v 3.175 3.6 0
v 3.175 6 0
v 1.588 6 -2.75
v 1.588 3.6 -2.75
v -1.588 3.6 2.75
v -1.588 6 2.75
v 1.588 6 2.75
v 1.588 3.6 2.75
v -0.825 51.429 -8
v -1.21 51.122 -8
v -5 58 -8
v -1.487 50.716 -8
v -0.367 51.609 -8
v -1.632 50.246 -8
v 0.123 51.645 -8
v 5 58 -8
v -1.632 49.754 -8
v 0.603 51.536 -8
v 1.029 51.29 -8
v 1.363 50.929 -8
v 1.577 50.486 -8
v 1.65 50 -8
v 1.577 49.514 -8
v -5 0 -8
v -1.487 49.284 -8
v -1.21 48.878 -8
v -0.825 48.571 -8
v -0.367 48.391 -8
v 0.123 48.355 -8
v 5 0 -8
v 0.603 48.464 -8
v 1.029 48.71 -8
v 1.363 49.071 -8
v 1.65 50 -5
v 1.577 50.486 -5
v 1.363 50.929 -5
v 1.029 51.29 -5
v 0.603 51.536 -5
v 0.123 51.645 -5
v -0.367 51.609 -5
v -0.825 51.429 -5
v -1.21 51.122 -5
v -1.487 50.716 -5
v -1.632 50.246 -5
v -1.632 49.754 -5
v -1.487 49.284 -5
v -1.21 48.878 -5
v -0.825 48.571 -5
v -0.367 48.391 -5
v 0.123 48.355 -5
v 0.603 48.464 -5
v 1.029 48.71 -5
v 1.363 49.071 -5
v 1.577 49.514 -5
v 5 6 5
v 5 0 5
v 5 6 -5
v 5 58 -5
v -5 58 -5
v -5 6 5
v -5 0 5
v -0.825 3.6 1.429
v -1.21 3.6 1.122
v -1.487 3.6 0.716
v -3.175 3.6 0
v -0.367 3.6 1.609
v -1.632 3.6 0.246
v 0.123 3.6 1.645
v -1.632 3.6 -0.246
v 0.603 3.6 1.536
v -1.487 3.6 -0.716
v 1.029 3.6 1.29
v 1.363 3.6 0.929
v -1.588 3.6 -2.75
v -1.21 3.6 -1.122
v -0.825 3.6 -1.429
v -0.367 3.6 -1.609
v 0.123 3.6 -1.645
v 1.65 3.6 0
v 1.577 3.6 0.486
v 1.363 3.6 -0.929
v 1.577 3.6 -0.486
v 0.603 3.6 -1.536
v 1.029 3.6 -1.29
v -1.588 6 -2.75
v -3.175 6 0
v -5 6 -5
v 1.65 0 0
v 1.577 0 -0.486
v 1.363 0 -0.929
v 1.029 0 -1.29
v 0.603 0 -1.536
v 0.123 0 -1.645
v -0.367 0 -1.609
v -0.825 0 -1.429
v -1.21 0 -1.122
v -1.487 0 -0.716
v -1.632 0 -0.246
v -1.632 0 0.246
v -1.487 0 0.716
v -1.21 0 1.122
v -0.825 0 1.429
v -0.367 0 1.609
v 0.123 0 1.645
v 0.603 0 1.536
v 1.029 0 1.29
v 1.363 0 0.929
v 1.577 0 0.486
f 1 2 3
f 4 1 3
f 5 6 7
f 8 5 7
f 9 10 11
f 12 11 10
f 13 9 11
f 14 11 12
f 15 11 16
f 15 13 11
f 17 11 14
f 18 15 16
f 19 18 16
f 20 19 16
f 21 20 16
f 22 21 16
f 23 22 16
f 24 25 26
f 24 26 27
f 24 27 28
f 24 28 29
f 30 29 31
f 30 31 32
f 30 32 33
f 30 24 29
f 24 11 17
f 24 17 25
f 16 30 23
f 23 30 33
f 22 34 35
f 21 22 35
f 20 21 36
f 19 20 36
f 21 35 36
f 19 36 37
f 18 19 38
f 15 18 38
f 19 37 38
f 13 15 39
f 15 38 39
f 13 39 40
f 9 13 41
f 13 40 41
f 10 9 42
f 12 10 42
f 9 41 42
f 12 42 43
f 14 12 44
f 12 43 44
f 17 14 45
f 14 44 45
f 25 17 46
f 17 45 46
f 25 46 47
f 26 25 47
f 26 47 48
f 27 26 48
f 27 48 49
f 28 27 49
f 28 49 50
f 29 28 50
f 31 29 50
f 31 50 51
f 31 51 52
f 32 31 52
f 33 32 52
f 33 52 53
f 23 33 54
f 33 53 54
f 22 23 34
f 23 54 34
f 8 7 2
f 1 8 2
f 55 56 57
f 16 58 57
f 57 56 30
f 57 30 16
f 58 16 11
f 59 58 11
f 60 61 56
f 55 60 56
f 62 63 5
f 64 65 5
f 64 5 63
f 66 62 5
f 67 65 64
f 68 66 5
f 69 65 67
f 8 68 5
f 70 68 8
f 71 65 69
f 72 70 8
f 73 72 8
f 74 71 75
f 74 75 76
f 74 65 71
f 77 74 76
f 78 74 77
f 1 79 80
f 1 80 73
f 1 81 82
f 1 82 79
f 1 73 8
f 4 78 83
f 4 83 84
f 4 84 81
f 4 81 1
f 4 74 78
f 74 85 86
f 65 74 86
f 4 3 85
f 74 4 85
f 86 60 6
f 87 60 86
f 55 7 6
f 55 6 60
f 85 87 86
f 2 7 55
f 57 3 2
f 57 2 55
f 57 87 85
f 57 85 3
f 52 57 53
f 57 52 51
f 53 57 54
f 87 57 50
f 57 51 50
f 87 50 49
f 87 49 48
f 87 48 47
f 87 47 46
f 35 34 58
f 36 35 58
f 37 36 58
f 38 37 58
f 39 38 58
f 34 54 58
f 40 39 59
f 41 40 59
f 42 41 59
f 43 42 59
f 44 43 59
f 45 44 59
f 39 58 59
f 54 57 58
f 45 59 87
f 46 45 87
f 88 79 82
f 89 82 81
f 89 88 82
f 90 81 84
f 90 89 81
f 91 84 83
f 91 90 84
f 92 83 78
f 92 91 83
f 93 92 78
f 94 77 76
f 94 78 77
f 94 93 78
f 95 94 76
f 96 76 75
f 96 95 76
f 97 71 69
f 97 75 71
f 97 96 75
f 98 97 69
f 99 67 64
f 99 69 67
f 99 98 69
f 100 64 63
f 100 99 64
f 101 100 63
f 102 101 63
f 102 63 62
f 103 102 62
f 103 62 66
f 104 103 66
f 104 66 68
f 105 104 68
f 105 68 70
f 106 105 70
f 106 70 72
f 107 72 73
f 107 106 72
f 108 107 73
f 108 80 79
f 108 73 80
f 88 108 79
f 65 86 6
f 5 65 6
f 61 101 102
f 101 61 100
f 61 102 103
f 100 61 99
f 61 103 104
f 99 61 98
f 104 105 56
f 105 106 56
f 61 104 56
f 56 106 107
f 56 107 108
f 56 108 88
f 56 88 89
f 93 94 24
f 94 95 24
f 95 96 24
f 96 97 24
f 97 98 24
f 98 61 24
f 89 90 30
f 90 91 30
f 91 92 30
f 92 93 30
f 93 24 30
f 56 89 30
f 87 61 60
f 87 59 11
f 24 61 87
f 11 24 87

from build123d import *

# Parameters (mm, degrees)
SKETCH1_W           = 10
SKETCH1_H           = 13
SKETCH1_R           = 1.65
BOSS_EXTRUDE1_DEPTH = 6
CUT_EXTRUDE1_DEPTH  = 2.4
SKETCH3_W           = 10
SKETCH3_H           = 58
BOSS_EXTRUDE2_DEPTH = 3
SKETCH4_R           = 1.65
CUT_EXTRUDE2_DEPTH  = 3


with BuildPart() as part:
    # Sketch1 → Boss-Extrude1 (new body)
    with BuildSketch(Plane(origin=(0, 0, 0), x_dir=(1, 0, 0), z_dir=(0, 1, 0))):
        with Locations((0, 1.5)):
            Rectangle(SKETCH1_W, SKETCH1_H)
        Circle(SKETCH1_R, mode=Mode.SUBTRACT)
    extrude(amount=BOSS_EXTRUDE1_DEPTH)

    # Sketch2 → Cut-Extrude1 (cut)
    with BuildSketch(Plane(origin=(0, 6, 0), x_dir=(1, 0, 0), z_dir=(0, 1, 0))):
        Polygon((3.175426481, 0), (1.58771324, 2.75), (-1.58771324, 2.75), (-3.175426481, 0), (-1.58771324, -2.75), (1.58771324, -2.75), align=None)
    extrude(amount=-CUT_EXTRUDE1_DEPTH, mode=Mode.SUBTRACT)

    # Sketch3 → Boss-Extrude2 (add)
    with BuildSketch(Plane(origin=(0, 0, -8), x_dir=(-1, 0, 0), z_dir=(0, 0, -1))):
        with Locations((0, 29)):
            Rectangle(SKETCH3_W, SKETCH3_H)
    extrude(amount=-BOSS_EXTRUDE2_DEPTH)

    # Sketch4 → Cut-Extrude2 (cut)
    with BuildSketch(Plane.XY.offset(-5)):
        with Locations((0, 50)):
            Circle(SKETCH4_R)
    extrude(amount=-CUT_EXTRUDE2_DEPTH, mode=Mode.SUBTRACT)


solid = part.part
